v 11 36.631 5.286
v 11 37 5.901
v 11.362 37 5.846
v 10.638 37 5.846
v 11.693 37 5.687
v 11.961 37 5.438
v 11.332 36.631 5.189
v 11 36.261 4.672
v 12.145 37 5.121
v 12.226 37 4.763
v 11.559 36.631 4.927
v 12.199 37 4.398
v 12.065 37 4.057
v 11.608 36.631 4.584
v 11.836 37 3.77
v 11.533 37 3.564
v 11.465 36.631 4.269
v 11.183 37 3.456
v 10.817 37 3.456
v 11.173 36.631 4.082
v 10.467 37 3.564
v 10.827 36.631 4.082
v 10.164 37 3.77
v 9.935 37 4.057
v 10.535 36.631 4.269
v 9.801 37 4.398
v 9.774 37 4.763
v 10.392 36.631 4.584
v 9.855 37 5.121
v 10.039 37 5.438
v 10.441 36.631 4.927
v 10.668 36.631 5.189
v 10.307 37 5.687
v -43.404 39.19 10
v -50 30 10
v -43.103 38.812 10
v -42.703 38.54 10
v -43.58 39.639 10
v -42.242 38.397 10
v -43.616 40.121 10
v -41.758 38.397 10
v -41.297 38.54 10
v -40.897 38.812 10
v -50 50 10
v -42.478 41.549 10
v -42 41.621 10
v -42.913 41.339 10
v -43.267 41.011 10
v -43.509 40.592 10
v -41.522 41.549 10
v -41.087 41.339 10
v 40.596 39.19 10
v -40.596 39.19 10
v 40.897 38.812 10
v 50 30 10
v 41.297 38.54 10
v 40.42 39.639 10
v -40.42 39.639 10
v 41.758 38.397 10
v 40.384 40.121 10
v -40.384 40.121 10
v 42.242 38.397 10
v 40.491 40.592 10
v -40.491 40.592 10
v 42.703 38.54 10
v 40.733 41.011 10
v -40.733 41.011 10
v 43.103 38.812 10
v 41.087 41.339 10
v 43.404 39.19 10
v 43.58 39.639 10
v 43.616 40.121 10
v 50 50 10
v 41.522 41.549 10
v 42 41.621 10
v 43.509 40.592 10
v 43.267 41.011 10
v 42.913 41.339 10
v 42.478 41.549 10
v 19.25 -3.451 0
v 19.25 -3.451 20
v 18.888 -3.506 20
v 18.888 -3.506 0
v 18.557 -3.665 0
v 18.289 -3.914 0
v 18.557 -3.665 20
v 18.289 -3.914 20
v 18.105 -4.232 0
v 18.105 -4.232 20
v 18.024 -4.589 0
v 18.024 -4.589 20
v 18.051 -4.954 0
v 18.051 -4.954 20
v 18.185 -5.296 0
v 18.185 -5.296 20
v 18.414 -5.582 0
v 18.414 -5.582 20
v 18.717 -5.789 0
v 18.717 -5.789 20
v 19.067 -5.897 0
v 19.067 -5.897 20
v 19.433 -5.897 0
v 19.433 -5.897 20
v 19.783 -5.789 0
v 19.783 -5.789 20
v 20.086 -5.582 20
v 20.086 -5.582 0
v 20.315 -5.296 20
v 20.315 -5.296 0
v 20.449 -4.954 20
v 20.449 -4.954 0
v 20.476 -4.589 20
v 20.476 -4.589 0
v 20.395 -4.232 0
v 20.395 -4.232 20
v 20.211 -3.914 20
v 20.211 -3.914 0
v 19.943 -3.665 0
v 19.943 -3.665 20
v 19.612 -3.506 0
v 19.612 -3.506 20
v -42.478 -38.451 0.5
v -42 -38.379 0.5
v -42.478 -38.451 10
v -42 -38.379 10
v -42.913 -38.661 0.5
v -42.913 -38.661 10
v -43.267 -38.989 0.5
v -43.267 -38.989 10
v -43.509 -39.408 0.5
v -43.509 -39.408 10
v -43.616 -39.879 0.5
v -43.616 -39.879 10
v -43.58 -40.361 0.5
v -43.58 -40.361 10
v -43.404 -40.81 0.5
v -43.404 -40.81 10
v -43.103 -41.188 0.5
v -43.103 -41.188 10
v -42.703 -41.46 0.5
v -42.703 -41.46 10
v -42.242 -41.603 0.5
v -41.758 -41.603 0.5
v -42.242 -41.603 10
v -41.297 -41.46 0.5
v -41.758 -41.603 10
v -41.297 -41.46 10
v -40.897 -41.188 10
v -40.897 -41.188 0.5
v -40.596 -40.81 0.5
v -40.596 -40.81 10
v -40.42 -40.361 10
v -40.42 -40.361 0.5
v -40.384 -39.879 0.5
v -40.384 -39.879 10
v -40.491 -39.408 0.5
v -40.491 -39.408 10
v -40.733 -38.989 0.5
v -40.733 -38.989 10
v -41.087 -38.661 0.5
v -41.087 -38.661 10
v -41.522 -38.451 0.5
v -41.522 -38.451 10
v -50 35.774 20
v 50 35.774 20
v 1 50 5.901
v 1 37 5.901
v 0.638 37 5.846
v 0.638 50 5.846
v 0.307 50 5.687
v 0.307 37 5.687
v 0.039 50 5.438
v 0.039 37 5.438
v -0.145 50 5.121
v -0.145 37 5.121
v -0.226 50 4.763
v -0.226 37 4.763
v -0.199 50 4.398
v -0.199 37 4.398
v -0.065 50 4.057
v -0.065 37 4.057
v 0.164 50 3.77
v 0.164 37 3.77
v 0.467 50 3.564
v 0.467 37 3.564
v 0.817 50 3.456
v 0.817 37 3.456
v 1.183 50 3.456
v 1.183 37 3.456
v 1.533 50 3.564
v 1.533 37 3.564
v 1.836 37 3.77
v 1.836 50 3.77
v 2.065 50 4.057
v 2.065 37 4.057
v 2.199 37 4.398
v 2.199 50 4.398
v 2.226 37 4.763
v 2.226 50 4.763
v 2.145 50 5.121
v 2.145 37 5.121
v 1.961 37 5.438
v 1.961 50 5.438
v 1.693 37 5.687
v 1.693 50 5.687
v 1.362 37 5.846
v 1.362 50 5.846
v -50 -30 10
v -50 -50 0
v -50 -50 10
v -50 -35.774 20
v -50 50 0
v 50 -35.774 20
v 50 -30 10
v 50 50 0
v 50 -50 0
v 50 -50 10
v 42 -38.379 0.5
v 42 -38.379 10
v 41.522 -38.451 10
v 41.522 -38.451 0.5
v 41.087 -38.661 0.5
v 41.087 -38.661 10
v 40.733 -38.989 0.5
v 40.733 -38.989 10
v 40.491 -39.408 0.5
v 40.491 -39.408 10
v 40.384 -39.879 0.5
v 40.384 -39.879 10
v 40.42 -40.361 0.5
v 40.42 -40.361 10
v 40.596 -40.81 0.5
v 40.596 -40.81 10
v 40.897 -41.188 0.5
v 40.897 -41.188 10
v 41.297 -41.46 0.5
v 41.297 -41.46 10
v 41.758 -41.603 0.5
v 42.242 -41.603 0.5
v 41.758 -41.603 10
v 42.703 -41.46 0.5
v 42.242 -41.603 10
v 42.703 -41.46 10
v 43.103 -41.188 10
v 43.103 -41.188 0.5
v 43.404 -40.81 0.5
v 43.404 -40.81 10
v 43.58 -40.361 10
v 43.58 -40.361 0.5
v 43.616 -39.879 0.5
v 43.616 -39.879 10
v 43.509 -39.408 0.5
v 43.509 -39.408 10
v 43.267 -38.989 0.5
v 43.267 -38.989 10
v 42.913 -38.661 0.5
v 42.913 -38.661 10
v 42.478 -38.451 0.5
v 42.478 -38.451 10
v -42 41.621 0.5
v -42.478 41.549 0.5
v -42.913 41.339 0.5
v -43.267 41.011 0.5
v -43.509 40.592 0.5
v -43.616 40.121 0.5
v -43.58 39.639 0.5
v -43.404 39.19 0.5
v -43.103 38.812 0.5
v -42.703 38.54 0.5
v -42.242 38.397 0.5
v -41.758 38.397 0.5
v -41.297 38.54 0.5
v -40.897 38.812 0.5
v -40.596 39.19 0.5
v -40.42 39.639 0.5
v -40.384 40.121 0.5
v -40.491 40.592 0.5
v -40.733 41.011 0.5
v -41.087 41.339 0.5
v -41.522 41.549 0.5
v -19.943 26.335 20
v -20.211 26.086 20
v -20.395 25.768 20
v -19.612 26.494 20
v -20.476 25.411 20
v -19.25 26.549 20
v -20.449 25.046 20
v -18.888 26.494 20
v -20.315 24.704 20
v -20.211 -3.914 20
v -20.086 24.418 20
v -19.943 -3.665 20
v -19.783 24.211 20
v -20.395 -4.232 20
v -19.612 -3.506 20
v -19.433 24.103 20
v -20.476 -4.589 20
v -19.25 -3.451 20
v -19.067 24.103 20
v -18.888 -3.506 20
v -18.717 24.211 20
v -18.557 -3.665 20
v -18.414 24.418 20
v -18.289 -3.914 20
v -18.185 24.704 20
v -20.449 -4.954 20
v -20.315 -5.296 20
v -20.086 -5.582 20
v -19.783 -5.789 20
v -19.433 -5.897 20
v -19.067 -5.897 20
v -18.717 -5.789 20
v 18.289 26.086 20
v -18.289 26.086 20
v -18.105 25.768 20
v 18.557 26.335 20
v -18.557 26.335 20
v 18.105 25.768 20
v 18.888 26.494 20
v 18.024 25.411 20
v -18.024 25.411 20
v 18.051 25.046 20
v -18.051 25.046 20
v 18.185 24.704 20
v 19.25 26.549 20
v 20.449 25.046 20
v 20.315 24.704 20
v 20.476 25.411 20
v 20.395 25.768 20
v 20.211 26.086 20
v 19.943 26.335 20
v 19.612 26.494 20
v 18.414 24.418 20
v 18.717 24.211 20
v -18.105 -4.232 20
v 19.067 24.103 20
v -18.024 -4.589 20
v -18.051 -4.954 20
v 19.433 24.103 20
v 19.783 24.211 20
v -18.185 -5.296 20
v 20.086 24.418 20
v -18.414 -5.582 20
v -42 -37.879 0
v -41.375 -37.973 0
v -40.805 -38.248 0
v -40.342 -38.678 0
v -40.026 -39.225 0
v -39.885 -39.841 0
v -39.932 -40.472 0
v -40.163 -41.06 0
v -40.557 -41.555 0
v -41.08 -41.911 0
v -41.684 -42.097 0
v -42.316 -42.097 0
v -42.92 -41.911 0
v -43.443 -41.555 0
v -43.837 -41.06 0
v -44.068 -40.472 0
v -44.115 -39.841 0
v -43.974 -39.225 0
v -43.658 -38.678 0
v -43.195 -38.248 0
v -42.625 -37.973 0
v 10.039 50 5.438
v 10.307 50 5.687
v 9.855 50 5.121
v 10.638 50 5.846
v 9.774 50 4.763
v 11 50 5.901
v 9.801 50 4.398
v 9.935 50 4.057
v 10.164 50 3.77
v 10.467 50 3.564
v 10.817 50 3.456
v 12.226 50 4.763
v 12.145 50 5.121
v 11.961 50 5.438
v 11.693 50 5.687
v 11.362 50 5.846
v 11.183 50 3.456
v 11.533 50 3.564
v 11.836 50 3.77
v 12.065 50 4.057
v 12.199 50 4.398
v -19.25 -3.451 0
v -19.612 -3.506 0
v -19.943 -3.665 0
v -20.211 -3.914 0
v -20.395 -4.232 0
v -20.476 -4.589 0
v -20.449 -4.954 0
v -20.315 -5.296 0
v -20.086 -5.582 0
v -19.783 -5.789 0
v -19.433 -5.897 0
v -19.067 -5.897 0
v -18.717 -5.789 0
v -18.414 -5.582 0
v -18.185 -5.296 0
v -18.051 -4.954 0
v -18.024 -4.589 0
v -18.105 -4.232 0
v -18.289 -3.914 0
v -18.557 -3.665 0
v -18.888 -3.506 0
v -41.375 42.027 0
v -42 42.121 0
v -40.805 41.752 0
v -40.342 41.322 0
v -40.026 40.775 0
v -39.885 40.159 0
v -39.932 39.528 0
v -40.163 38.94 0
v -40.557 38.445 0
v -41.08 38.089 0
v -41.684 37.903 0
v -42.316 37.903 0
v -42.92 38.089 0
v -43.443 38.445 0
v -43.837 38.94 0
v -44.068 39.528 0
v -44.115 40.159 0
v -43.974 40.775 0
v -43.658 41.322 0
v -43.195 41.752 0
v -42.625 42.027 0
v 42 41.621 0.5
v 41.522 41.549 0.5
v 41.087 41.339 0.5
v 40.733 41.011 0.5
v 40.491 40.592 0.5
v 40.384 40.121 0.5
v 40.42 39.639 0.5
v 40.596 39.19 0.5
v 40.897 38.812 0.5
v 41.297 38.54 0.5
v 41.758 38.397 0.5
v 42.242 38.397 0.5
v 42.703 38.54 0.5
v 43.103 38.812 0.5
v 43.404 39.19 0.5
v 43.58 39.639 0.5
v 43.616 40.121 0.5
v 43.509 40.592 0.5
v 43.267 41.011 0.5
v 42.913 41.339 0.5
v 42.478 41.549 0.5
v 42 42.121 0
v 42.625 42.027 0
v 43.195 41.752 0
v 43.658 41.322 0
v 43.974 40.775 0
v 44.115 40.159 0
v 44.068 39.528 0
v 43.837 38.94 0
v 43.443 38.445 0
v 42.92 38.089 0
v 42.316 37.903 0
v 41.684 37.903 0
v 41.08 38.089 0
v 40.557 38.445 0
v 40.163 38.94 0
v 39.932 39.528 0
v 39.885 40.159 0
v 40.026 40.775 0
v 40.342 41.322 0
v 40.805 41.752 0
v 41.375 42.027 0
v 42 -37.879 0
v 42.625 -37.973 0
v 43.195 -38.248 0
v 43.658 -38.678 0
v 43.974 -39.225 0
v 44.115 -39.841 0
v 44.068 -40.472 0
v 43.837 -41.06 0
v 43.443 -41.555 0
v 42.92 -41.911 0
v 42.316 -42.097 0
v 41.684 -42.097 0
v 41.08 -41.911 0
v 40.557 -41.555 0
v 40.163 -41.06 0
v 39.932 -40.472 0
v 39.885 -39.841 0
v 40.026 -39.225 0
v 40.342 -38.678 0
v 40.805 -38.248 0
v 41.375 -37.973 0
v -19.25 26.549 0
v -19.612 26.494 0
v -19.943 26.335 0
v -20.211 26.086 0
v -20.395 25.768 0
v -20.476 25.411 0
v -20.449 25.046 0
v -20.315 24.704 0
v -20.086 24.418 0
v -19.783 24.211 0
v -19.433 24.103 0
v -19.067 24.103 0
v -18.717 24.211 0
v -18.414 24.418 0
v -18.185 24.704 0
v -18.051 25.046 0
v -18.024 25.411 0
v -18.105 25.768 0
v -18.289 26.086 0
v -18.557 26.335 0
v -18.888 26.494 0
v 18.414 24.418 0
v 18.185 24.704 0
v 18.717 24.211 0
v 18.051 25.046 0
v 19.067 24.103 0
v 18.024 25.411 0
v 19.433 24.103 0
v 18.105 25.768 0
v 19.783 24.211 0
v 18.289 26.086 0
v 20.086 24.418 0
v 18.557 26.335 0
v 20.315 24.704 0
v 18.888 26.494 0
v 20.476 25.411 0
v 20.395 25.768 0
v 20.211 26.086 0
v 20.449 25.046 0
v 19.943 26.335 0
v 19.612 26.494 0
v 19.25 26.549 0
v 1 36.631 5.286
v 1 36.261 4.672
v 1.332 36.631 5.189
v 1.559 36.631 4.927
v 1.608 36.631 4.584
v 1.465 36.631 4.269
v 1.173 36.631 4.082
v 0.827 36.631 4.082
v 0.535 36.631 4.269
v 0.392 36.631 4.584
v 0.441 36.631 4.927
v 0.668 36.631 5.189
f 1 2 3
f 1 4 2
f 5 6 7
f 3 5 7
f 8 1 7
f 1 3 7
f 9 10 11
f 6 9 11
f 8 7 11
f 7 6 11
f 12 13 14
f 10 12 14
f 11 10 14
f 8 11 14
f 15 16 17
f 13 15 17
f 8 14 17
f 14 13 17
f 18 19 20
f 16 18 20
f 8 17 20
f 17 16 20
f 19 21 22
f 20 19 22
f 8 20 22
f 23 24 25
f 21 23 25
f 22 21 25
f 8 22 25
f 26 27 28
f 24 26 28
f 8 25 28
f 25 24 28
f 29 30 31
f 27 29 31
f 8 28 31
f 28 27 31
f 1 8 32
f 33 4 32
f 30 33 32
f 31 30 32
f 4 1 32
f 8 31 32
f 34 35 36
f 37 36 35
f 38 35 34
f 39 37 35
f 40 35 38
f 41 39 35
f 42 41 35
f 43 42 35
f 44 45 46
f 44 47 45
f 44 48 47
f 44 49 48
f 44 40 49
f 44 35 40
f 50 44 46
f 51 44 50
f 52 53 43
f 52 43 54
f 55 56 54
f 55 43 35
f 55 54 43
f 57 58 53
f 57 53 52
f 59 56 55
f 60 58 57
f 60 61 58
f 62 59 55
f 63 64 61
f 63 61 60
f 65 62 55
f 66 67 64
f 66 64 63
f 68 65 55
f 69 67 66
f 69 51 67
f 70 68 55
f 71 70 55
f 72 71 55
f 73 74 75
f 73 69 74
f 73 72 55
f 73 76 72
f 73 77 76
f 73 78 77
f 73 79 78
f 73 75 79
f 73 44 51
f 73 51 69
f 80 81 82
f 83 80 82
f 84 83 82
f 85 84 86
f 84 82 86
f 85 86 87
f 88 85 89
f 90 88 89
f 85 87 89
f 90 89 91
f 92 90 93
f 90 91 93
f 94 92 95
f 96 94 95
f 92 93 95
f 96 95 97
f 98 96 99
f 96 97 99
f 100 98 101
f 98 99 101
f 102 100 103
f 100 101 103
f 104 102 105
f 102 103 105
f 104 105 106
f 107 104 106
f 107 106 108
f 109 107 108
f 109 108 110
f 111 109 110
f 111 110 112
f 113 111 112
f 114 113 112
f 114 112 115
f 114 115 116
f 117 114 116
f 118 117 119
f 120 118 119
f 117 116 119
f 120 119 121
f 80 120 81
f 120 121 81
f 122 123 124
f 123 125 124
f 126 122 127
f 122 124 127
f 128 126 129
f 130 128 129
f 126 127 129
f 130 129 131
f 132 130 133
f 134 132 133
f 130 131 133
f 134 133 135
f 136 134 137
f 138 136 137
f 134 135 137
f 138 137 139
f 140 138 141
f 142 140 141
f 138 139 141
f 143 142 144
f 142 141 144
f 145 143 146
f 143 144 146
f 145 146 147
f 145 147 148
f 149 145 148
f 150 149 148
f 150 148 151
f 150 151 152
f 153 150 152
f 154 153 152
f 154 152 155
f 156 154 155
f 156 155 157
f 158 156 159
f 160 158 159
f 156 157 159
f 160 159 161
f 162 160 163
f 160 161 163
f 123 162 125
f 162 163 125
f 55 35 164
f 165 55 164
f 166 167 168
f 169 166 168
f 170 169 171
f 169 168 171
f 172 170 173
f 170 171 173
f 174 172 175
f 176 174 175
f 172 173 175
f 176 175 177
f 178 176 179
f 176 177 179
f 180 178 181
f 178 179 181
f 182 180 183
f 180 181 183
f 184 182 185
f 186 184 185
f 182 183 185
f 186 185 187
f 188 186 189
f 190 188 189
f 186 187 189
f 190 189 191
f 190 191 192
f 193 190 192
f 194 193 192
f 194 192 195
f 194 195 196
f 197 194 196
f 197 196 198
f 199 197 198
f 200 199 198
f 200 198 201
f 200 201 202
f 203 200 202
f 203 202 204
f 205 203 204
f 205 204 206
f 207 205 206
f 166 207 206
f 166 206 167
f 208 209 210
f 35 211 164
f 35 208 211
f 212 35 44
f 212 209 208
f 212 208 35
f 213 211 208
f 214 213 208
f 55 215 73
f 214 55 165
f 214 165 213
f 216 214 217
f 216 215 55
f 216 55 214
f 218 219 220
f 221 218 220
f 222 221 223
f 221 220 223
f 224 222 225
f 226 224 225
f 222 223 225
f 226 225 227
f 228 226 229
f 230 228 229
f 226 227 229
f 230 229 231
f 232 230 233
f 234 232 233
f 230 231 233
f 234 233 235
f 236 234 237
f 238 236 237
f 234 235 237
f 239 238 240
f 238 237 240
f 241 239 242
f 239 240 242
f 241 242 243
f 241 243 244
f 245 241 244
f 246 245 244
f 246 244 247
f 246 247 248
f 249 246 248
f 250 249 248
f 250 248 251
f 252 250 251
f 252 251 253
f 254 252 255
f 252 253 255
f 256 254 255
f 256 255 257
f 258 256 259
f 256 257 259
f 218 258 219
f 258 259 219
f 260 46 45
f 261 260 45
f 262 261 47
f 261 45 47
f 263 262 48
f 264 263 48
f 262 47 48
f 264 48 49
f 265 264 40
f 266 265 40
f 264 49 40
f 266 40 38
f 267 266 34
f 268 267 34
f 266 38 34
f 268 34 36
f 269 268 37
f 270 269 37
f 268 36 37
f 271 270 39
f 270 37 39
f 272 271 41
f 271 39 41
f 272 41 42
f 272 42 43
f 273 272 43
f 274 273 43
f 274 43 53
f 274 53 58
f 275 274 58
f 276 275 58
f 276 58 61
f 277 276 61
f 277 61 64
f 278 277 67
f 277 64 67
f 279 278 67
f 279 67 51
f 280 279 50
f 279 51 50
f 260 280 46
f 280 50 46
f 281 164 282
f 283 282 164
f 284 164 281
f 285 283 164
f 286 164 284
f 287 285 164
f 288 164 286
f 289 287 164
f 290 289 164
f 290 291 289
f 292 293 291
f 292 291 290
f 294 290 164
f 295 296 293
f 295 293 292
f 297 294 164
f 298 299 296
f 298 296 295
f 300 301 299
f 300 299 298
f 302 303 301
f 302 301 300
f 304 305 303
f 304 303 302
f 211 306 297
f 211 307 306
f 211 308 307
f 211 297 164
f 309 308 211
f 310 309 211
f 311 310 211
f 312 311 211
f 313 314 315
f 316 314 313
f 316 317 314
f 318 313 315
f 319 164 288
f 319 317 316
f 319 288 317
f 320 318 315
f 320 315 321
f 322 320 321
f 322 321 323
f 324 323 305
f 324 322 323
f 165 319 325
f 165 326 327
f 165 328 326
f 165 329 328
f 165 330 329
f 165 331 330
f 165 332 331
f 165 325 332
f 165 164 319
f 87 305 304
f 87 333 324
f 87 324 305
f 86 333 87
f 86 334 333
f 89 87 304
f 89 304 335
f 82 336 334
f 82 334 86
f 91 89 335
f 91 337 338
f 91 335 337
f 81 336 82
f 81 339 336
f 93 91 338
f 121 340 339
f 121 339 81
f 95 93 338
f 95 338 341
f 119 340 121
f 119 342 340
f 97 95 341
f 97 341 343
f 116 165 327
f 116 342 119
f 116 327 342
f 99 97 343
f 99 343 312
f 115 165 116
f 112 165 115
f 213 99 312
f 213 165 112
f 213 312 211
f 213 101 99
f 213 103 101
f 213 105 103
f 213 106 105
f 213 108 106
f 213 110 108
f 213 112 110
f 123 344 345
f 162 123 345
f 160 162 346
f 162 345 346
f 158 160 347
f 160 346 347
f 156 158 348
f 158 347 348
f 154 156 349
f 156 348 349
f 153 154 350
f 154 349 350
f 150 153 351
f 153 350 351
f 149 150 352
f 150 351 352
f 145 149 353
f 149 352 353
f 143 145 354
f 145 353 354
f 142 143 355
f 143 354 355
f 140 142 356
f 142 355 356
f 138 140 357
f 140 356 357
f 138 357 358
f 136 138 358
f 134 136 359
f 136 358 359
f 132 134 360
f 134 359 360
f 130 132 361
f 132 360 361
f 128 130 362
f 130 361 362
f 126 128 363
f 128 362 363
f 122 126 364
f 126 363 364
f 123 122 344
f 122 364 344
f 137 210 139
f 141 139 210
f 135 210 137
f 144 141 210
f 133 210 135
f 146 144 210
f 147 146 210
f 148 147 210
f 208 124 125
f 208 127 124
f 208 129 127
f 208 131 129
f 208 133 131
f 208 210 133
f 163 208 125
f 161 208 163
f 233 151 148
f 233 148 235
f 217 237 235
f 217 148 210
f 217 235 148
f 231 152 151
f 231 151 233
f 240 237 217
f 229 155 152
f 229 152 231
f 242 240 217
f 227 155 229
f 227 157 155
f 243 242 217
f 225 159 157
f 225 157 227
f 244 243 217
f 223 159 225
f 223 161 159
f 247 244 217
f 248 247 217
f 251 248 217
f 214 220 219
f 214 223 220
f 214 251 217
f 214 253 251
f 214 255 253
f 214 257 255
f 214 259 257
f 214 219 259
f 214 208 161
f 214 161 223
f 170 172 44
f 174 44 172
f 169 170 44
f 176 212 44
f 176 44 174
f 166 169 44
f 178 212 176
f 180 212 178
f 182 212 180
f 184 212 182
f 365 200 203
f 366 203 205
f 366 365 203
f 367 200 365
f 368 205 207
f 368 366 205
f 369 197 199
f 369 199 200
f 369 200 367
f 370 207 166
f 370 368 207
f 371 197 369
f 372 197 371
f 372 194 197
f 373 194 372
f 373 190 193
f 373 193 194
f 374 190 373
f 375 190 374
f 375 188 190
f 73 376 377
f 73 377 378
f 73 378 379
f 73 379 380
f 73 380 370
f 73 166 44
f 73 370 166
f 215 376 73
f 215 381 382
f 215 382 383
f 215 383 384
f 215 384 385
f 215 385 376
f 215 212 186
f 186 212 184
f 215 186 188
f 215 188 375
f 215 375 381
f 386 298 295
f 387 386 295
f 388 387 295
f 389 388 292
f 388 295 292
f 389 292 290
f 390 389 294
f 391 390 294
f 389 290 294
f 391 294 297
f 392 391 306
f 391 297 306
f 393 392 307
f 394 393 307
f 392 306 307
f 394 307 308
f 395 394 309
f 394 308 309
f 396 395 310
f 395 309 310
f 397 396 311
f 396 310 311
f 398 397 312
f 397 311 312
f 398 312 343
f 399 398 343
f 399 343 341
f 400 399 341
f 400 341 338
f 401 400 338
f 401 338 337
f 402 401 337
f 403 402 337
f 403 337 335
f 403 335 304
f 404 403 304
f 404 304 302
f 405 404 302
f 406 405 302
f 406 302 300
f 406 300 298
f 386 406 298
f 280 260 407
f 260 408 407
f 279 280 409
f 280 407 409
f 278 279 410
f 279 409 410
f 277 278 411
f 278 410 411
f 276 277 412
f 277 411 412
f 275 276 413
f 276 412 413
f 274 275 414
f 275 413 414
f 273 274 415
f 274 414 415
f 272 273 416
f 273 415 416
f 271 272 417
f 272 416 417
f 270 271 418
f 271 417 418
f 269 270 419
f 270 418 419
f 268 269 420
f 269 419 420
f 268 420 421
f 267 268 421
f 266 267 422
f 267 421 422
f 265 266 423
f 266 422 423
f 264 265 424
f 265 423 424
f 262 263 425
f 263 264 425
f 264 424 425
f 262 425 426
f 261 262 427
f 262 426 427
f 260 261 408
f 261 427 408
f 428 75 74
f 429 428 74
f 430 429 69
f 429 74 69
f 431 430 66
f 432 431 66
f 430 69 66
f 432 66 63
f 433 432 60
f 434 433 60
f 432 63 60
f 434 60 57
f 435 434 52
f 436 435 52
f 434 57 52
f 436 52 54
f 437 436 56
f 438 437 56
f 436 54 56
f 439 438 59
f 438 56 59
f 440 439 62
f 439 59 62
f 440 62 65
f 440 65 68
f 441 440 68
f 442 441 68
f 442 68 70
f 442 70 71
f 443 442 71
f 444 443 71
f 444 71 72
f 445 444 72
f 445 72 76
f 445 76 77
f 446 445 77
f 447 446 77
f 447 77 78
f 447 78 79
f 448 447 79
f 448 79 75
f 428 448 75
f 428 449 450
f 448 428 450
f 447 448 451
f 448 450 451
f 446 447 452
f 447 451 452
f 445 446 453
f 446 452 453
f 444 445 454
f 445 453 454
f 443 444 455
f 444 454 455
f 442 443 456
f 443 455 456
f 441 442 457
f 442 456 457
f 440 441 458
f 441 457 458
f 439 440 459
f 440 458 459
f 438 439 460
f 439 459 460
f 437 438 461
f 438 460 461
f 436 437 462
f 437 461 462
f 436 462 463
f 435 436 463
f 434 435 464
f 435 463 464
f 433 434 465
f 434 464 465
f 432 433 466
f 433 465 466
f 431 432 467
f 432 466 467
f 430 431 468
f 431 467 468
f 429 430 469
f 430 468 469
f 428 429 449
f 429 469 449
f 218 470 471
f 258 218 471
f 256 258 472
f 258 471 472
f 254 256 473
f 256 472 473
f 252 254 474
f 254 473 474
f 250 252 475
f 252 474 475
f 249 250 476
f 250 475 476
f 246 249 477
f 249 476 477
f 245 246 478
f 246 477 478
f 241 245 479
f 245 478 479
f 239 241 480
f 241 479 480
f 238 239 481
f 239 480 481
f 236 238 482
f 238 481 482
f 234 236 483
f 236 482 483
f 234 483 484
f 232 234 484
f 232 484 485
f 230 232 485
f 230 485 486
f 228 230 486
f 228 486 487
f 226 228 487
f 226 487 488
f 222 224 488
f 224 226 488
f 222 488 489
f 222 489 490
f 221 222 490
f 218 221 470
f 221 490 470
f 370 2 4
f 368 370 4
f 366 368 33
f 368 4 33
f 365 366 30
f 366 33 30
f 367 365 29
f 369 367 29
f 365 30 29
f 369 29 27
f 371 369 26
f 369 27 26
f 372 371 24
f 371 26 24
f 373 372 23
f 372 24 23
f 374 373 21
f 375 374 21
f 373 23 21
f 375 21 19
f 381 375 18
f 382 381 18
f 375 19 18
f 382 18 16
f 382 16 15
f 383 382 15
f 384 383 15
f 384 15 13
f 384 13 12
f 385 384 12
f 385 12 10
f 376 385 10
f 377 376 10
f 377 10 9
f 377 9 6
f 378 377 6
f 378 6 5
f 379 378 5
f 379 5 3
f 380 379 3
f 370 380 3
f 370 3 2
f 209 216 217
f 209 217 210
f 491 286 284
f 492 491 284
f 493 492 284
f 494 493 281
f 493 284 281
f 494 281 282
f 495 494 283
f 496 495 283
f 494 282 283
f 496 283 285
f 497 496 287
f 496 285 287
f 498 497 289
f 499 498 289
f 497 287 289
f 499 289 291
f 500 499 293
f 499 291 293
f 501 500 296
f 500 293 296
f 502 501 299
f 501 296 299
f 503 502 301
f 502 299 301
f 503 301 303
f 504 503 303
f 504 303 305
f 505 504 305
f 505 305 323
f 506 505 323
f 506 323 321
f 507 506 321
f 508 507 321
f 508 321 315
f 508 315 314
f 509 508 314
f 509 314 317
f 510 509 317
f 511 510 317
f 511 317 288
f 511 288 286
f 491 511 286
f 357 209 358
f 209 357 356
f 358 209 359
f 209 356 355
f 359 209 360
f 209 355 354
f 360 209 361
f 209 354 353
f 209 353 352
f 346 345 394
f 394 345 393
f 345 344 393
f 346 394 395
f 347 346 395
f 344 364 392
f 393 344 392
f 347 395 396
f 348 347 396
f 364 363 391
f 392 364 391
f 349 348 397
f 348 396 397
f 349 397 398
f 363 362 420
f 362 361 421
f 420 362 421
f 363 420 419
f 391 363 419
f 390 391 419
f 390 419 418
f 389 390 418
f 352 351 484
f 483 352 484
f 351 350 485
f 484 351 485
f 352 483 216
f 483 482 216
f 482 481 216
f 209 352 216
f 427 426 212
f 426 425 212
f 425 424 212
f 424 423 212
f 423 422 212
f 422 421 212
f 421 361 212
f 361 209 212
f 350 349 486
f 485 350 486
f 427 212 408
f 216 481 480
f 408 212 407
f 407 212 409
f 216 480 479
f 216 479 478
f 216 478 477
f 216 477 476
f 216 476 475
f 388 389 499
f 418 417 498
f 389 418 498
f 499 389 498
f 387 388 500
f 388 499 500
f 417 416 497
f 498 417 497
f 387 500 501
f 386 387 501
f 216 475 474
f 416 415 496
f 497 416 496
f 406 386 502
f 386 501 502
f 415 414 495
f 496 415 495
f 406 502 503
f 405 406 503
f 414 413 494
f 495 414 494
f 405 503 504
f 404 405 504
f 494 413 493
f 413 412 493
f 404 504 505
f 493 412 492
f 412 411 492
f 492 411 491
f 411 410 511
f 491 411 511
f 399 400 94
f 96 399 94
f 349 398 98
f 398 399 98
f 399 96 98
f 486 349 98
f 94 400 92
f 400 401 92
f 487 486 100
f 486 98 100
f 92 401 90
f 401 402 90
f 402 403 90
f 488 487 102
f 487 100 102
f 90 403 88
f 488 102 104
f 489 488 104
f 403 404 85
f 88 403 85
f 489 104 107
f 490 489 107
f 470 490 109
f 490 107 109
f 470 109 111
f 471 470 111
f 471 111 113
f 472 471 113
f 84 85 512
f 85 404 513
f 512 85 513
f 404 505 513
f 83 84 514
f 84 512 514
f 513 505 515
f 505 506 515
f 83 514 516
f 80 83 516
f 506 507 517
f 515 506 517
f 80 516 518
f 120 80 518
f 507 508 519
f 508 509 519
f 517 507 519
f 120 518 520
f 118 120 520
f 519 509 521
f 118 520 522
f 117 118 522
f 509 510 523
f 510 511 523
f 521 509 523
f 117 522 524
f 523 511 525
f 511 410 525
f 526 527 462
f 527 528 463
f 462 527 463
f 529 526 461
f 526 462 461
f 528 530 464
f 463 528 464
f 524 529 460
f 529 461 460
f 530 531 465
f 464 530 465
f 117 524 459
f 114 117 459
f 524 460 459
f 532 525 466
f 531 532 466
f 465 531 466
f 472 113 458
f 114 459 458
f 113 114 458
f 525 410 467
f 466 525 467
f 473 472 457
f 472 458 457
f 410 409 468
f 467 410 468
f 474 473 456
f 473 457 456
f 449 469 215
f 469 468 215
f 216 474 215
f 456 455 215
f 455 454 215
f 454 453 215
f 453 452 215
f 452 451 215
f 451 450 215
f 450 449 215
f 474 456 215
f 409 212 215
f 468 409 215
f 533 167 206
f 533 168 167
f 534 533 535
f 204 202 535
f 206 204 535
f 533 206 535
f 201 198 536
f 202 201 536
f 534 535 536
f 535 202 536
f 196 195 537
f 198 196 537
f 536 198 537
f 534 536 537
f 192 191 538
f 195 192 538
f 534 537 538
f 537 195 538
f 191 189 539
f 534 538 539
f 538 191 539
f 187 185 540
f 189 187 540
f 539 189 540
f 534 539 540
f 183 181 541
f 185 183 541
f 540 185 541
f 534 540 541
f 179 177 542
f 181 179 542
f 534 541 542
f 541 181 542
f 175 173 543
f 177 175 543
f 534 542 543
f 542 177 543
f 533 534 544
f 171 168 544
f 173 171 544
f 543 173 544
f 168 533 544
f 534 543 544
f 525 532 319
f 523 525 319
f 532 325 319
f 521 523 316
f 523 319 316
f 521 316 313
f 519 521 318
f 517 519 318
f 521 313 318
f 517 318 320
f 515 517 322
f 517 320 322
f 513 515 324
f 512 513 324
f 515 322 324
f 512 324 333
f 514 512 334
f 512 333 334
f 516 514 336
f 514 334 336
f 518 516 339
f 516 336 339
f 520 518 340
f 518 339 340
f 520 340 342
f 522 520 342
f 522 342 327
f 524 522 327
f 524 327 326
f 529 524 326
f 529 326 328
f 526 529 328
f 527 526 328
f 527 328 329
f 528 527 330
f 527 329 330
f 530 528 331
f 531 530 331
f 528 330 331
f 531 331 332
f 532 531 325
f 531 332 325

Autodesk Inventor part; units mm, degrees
ref_plane "YZ Plane" through (0, 0, 0) normal (1, 0, 0) x (0, 1, 0)
ref_plane "XZ Plane" through (0, 0, 0) normal (0, 1, 0) x (-1, 0, 0)
ref_plane "XY Plane" through (0, 0, 0) normal (0, 0, 1) x (1, 0, 0)
sketch "Sketch1" plane through (0, 0, 0) normal (0, 0, 1) x (1, 0, 0)
  line L0 (-50, 50) -> (50, 50)
  line L1 (50, 50) -> (50, -50)
  line L2 (50, -50) -> (-50, -50)
  line L3 (-50, -50) -> (-50, 50)
  line L4 (0, 0) -> (0, 10.7535) construction
  line L5 (0, 0) -> (8.6992, 0) construction
  dimension "d0" = 100
  dimension "d1" = 100
extrude "Extrusion1" add sketch "Sketch1" along normal blind 10
sketch "Sketch2" plane through (50, -50, 0) normal (1, 0, 0) x (0, 0, -1)
  line L0 (-10, 80) -> (-20, 85.7735)
  line L1 (-20, 85.7735) -> (-20, 14.2265)
  line L2 (-20, 14.2265) -> (-10, 20)
  line L3 (0, 0) -> (-10, 0) projected
  line L4 (0, 100) -> (-10, 100) projected
  line L5 (-10, 80) -> (-10, 20)
  line L6 (-10, 0) -> (-10, 100) projected
  point P0 (0, 50)
  dimension "d4" = 60
  dimension "d5" = 60
  dimension "d6" = 20
  dimension "d7" = 20
  dimension "d19" = 10
extrude "Extrusion2" add sketch "Sketch2" against normal blind 100
sketch "Sketch3" plane through (0, 0, 0) normal (0, 0, -1) x (-1, 0, 0)
  circle A0 centre (19.25, -4.6808) radius 1.6 projected
  circle A1 centre (19.25, 25.3192) radius 1.6 projected
  circle A2 centre (-19.25, 25.3192) radius 1.6 projected
  circle A3 centre (-19.25, -4.6808) radius 1.6 projected
  point P0 (0, 0)
hole "Hole1" at (19.25, 25.3192, 0) at (19.25, -4.6808, 0) at (-19.25, 25.3192, 0) at (-19.25, -4.6808, 0) direction (0, 0, 1) diameter 2.459 end through all thread size "M3x0.5" class "6H" standard "ISO Metric profile"
sketch "Sketch4" plane through (0, 0, 0) normal (0, 0, -1) x (-1, 0, 0)
  line L0 (50, -50) -> (50, 50) projected
  line L1 (-50, -50) -> (50, -50) projected
  line L2 (50, 50) -> (-50, 50) projected
  line L3 (-50, 50) -> (-50, -50) projected
  point P0 (0, 0)
  point P1 (42, -40)
  point P2 (42, 40)
  point P3 (-42, 40)
  point P4 (-42, -40)
  dimension "d20" = 8
  dimension "d21" = 10
  dimension "d22" = 10
  dimension "d23" = 8
hole "Hole2" at (-42, -40, 0) at (-42, 40, 0) at (42, 40, 0) at (42, -40, 0) direction (0, 0, 1) diameter 3.242 depth 11.8 tip angle 118 thread size "M4x0.7" class "6H" standard "ISO Metric profile"
chamfer "Chamfer1" distance 0.5 angle 45 4 edges at (-42, -41.621, 0) (42, -41.621, 0) (-42, 38.379, 0) (42, 38.379, 0)
sketch "Sketch5" plane through (-50, 50, 0) normal (0, 1, 0) x (1, 0, 0)
  circle A0 centre (51, -4.6715) radius 1.6 projected
  circle A1 centre (61, -4.6715) radius 1.6 projected
  point P0 (50, 0)
hole "Hole3" at (1, 50, 4.6715) at (11, 50, 4.6715) direction (0, -1, 0) diameter 2.459 depth 13 tip angle 118 thread size "M3x0.5" class "6H" standard "ISO Metric profile"
properties part number "3d_LM-Welding_Tooling - Upper moving base" material "Aluminium 6061-T6"
